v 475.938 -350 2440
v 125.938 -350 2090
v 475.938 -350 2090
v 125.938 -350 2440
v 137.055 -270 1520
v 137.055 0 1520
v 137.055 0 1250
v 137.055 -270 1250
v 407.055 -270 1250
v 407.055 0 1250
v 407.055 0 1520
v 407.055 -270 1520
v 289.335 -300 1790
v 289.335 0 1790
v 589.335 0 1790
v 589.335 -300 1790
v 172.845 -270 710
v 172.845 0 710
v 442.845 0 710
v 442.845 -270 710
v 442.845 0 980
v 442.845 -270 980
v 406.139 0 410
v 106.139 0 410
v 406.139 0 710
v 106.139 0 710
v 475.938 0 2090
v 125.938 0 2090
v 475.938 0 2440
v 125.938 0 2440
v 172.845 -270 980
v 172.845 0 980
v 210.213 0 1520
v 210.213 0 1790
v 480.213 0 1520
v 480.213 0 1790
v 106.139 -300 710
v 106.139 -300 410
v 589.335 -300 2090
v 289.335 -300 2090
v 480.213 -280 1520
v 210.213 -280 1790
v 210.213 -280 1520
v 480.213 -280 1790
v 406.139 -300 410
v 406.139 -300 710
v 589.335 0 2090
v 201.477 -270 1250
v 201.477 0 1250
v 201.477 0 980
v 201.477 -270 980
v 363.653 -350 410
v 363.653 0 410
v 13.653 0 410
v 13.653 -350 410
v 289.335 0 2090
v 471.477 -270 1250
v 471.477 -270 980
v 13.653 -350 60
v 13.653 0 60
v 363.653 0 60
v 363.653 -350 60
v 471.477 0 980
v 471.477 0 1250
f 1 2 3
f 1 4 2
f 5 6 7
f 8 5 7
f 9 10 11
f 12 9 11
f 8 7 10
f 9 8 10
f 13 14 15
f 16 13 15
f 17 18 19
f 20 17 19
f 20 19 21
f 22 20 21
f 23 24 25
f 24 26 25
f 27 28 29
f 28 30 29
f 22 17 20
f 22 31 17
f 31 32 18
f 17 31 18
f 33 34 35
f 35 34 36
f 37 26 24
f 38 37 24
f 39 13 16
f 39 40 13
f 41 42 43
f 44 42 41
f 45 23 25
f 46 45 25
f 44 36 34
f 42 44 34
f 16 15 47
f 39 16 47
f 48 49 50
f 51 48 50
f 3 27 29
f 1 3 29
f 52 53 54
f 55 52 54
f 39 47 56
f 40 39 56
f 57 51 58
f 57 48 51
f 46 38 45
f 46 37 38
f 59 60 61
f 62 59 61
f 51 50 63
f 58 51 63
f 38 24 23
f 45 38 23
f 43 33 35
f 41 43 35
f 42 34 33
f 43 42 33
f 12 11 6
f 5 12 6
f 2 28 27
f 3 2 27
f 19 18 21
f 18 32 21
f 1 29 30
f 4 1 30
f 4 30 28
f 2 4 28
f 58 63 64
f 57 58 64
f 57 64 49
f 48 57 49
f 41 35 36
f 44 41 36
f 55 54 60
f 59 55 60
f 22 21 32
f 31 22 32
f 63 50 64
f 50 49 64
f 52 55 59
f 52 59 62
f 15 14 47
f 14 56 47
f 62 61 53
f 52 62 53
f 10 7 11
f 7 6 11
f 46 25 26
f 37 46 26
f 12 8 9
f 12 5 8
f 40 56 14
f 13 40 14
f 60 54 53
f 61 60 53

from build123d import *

# Parameters (mm, degrees)
F4_DEPTH = 350
F5_DEPTH = 300
F6_DEPTH = 270
F7_DEPTH = 270
F8_DEPTH = 270
F9_DEPTH = 280


with BuildPart() as f4:
    # F3 (on Front) → F4 (new body)
    with BuildSketch(Plane.XZ):
        Polygon((13.6533863842, 410), (13.6533863842, 60), (363.6533863842, 60), (363.6533863842, 410), (106.1394568533, 410), align=None)
    extrude(amount=F4_DEPTH)


with BuildPart() as f4b:
    # F3 (on Front) → F4, piece 2 (new body)
    with BuildSketch(Plane.XZ):
        Polygon((125.9381771088, 2090), (289.3347740173, 2090), (475.9381771088, 2090), (475.9381771088, 2440), (125.9381771088, 2440), align=None)
    extrude(amount=F4_DEPTH)


with BuildPart() as f5:
    # F3 (on Front) → F5 (new body)
    with BuildSketch(Plane.XZ):
        Polygon((106.1394568533, 410), (363.6533863842, 410), (406.1394568533, 410), (406.1394568533, 710), (172.8452146053, 710), (106.1394568533, 710), align=None)
    extrude(amount=F5_DEPTH)


with BuildPart() as f5b:
    # F3 (on Front) → F5, piece 2 (new body)
    with BuildSketch(Plane.XZ):
        Polygon((289.3347740173, 1790), (480.2133631706, 1790), (589.3347740173, 1790), (589.3347740173, 2090), (475.9381771088, 2090), (289.3347740173, 2090), align=None)
    extrude(amount=F5_DEPTH)


with BuildPart() as f6:
    # F3 (on Front) → F6 (new body)
    with BuildSketch(Plane.XZ):
        Polygon((172.8452146053, 710), (406.1394568533, 710), (442.8452146053, 710), (442.8452146053, 980), (201.476752758, 980), (172.8452146053, 980), align=None)
    extrude(amount=F6_DEPTH)


with BuildPart() as f7:
    # F3 (on Front) → F7 (new body)
    with BuildSketch(Plane.XZ):
        Polygon((201.476752758, 980), (442.8452146053, 980), (471.476752758, 980), (471.476752758, 1250), (407.0549201965, 1250), (201.476752758, 1250), align=None)
    extrude(amount=F7_DEPTH)


with BuildPart() as f8:
    # F3 (on Front) → F8 (new body)
    with BuildSketch(Plane.XZ):
        Polygon((137.0549201965, 1250), (201.476752758, 1250), (407.0549201965, 1250), (407.0549201965, 1520), (210.2133631706, 1520), (137.0549201965, 1520), align=None)
    extrude(amount=F8_DEPTH)


with BuildPart() as f9:
    # F3 (on Front) → F9 (new body)
    with BuildSketch(Plane.XZ):
        Polygon((210.2133631706, 1520), (407.0549201965, 1520), (480.2133631706, 1520), (480.2133631706, 1790), (289.3347740173, 1790), (210.2133631706, 1790), align=None)
    extrude(amount=F9_DEPTH)


solid = Compound([f4.part, f4b.part, f5.part, f5b.part, f6.part, f7.part, f8.part, f9.part])
